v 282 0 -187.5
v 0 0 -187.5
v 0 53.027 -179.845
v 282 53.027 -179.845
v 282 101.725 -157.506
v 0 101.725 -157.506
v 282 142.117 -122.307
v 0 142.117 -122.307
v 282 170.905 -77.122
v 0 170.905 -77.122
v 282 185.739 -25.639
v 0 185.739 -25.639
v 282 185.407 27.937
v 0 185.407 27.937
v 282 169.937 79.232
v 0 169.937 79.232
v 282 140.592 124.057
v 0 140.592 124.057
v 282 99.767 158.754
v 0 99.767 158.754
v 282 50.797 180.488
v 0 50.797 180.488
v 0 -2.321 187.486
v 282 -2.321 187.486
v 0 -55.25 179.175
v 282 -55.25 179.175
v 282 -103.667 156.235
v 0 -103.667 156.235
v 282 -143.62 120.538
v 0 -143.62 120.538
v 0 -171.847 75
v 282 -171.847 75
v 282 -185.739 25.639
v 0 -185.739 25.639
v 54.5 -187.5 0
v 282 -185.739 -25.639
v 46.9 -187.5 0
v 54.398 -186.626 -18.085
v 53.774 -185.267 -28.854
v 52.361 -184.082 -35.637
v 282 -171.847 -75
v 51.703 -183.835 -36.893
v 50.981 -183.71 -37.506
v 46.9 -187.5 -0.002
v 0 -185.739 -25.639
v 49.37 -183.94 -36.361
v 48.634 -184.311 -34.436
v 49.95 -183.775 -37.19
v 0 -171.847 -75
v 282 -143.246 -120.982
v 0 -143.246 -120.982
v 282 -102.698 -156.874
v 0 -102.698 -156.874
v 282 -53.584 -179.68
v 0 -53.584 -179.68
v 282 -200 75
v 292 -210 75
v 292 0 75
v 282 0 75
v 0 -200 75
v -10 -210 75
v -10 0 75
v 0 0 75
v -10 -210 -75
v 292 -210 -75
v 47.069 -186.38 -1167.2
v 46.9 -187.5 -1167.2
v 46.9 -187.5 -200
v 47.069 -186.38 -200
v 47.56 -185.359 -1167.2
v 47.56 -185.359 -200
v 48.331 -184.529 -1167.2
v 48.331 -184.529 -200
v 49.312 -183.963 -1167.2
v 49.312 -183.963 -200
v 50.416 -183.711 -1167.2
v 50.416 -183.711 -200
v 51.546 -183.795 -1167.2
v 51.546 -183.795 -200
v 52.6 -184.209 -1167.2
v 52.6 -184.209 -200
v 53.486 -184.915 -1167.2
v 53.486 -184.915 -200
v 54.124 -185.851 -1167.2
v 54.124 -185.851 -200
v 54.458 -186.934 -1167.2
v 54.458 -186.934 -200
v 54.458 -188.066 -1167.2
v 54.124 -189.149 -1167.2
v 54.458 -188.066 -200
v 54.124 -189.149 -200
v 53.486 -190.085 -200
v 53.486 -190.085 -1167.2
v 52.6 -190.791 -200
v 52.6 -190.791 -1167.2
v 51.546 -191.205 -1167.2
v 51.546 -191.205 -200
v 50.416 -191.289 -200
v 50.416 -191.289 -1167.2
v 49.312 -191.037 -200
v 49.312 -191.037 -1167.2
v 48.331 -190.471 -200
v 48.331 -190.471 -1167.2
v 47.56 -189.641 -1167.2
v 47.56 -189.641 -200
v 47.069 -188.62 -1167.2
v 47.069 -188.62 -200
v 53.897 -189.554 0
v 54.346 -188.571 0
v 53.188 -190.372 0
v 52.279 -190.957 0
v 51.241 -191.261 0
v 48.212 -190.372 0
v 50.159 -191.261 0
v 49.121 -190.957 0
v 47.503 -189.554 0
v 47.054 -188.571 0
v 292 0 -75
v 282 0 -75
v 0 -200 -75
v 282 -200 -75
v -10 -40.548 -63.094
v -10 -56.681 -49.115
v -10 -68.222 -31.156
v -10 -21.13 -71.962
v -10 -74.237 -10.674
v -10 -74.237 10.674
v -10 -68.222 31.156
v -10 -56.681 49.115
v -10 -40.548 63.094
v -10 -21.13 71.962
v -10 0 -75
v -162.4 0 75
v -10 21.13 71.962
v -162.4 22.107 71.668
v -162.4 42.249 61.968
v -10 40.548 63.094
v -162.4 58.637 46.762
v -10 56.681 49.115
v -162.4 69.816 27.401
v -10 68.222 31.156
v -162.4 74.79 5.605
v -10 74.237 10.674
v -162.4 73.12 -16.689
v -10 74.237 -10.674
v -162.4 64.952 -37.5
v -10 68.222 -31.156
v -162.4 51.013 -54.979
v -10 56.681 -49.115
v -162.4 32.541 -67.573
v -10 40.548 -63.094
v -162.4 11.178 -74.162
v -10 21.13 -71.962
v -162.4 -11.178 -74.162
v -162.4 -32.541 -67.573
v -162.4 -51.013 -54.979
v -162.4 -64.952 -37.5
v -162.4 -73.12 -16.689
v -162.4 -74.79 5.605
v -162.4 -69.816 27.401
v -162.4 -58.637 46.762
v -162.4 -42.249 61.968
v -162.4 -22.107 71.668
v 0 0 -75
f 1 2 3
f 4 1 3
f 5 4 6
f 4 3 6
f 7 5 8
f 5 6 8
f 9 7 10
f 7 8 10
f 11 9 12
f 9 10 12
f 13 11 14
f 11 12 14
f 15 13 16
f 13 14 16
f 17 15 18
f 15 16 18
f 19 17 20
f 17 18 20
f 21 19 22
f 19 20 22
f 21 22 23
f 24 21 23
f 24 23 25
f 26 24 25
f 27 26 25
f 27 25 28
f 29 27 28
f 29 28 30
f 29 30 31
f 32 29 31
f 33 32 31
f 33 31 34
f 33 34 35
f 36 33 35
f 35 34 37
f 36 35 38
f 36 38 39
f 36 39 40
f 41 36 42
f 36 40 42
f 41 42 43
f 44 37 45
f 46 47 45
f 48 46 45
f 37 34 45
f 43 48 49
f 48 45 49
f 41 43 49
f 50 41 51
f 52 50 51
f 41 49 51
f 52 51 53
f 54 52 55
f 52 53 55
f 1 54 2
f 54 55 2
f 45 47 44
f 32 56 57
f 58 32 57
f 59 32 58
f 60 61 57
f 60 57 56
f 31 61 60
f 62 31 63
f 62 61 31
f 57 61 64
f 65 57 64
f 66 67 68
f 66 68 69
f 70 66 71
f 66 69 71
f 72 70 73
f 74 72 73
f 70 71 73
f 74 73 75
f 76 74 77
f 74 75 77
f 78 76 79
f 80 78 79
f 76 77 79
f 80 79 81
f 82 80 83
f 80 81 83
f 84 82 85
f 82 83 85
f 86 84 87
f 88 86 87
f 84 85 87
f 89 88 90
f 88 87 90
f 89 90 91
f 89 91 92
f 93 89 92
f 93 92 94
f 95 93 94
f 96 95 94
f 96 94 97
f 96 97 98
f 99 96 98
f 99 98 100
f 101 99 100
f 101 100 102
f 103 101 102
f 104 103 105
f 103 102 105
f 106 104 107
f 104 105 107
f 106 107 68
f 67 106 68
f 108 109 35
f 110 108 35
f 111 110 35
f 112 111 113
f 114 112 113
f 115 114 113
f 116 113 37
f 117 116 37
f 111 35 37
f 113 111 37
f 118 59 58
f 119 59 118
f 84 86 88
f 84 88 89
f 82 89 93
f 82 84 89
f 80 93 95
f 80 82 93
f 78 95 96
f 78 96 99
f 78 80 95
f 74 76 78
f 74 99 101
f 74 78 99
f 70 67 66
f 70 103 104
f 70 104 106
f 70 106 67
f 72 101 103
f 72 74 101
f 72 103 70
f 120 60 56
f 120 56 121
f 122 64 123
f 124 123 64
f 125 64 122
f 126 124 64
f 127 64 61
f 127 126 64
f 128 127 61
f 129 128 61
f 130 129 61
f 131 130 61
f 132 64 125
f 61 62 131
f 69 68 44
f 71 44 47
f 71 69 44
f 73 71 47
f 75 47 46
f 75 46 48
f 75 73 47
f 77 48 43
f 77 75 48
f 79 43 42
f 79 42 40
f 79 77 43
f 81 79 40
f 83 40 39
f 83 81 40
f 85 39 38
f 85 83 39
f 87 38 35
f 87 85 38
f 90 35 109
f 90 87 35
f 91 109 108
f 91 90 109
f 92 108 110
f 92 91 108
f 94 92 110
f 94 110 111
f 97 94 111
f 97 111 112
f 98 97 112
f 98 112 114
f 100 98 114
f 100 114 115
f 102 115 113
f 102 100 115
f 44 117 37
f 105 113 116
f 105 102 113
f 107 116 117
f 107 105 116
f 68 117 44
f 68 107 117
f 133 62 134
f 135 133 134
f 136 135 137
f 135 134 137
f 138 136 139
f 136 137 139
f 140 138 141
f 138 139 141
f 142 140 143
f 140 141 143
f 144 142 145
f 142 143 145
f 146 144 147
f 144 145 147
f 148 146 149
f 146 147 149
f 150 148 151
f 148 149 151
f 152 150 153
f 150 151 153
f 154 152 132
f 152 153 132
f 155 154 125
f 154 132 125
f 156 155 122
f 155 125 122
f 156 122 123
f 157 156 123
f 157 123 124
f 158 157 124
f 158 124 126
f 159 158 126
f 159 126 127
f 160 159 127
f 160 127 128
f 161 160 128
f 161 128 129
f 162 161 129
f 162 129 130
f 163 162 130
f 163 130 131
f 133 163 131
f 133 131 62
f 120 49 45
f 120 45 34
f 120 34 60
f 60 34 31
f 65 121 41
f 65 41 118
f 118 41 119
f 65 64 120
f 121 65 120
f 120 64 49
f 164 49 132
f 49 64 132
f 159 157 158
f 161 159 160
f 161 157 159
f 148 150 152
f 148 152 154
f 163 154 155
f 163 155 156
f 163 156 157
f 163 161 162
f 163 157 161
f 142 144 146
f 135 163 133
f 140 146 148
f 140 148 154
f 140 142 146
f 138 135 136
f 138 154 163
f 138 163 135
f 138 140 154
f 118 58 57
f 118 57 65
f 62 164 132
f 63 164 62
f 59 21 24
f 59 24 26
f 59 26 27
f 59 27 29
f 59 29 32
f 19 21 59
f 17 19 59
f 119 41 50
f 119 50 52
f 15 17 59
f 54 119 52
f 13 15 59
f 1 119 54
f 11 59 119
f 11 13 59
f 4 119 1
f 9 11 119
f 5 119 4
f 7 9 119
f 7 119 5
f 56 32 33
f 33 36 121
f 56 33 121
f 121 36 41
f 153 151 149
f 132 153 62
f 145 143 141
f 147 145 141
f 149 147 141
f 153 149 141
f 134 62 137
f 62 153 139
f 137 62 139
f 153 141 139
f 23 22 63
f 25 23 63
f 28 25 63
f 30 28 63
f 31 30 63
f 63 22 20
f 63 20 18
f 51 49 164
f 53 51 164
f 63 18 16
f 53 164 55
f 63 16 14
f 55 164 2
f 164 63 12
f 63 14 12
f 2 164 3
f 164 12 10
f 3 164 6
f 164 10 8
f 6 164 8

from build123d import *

# Parameters (mm, degrees)
SKETCH1_R           = 187.5
BOSS_EXTRUDE1_DEPTH = 282
SKETCH2_W           = 150
SKETCH2_H           = 210
BOSS_EXTRUDE2_DEPTH = 10
SKETCH3_W           = 150
SKETCH3_H           = 210
BOSS_EXTRUDE3_DEPTH = 10
BOSS_EXTRUDE4_REACH = 294
SKETCH4_W           = 150
SKETCH4_H           = 10
SKETCH5_R           = 75
BOSS_EXTRUDE5_DEPTH = 152.4
SKETCH7_R           = 3.8
SKETCH8_R           = 3.8
BOSS_EXTRUDE6_DEPTH = 967.2


with BuildPart() as part:
    # Sketch1 → Boss-Extrude1 (new body)
    with BuildSketch(Plane(origin=(0, 0, 0), x_dir=(0, 0, -1), z_dir=(1, 0, 0))):
        Circle(SKETCH1_R)
    extrude(amount=BOSS_EXTRUDE1_DEPTH)

    # Sketch2 → Boss-Extrude2 (add)
    with BuildSketch(Plane.ZY):
        with Locations((0, -105)):
            Rectangle(SKETCH2_W, SKETCH2_H)
    extrude(amount=BOSS_EXTRUDE2_DEPTH)

    # Sketch3 → Boss-Extrude3 (add)
    with BuildSketch(Plane(origin=(282, 0, 0), x_dir=(0, 0, -1), z_dir=(1, 0, 0))):
        with Locations((0, -105)):
            Rectangle(SKETCH3_W, SKETCH3_H)
    extrude(amount=BOSS_EXTRUDE3_DEPTH)

    # Sketch4 → Boss-Extrude4 (add, up to next)
    with BuildSketch(Plane(origin=(0, 0, 0), x_dir=(0, 0, -1), z_dir=(1, 0, 0)), mode=Mode.PRIVATE) as boss_extrude4_sk1:
        with Locations((0, -205)):
            Rectangle(SKETCH4_W, SKETCH4_H)
    boss_extrude4_tool1 = extrude(boss_extrude4_sk1.sketch, amount=BOSS_EXTRUDE4_REACH, mode=Mode.PRIVATE) - part.part
    add(boss_extrude4_tool1.solids().sort_by_distance((0, -205, 0))[0])

    # Sketch5 → Boss-Extrude5 (add)
    with BuildSketch(Plane.ZY.offset(10)):
        Circle(SKETCH5_R)
    extrude(amount=BOSS_EXTRUDE5_DEPTH)

    # Sweep1: sweep along a path in Sketch6
    with BuildLine(Plane(origin=(50.7, 0, 0), x_dir=(0, 0, -1), z_dir=(1, 0, 0))) as sweep1_path:
        Line((0, -187.5), (200, -187.5))
    # Sketch7 → Sweep1 (sweep)
    with BuildSketch(Plane(origin=(0, 0, -200), x_dir=(-1, 0, 0), z_dir=(0, 0, -1))):
        with Locations((-50.7, -187.5)):
            Circle(SKETCH7_R)
    sweep(path=sweep1_path.line)

    # Sketch8 → Boss-Extrude6 (add)
    with BuildSketch(Plane(origin=(0, 0, -200), x_dir=(-1, 0, 0), z_dir=(0, 0, -1))):
        with Locations((-50.7, -187.5)):
            Circle(SKETCH8_R)
    extrude(amount=BOSS_EXTRUDE6_DEPTH)


solid = part.part
